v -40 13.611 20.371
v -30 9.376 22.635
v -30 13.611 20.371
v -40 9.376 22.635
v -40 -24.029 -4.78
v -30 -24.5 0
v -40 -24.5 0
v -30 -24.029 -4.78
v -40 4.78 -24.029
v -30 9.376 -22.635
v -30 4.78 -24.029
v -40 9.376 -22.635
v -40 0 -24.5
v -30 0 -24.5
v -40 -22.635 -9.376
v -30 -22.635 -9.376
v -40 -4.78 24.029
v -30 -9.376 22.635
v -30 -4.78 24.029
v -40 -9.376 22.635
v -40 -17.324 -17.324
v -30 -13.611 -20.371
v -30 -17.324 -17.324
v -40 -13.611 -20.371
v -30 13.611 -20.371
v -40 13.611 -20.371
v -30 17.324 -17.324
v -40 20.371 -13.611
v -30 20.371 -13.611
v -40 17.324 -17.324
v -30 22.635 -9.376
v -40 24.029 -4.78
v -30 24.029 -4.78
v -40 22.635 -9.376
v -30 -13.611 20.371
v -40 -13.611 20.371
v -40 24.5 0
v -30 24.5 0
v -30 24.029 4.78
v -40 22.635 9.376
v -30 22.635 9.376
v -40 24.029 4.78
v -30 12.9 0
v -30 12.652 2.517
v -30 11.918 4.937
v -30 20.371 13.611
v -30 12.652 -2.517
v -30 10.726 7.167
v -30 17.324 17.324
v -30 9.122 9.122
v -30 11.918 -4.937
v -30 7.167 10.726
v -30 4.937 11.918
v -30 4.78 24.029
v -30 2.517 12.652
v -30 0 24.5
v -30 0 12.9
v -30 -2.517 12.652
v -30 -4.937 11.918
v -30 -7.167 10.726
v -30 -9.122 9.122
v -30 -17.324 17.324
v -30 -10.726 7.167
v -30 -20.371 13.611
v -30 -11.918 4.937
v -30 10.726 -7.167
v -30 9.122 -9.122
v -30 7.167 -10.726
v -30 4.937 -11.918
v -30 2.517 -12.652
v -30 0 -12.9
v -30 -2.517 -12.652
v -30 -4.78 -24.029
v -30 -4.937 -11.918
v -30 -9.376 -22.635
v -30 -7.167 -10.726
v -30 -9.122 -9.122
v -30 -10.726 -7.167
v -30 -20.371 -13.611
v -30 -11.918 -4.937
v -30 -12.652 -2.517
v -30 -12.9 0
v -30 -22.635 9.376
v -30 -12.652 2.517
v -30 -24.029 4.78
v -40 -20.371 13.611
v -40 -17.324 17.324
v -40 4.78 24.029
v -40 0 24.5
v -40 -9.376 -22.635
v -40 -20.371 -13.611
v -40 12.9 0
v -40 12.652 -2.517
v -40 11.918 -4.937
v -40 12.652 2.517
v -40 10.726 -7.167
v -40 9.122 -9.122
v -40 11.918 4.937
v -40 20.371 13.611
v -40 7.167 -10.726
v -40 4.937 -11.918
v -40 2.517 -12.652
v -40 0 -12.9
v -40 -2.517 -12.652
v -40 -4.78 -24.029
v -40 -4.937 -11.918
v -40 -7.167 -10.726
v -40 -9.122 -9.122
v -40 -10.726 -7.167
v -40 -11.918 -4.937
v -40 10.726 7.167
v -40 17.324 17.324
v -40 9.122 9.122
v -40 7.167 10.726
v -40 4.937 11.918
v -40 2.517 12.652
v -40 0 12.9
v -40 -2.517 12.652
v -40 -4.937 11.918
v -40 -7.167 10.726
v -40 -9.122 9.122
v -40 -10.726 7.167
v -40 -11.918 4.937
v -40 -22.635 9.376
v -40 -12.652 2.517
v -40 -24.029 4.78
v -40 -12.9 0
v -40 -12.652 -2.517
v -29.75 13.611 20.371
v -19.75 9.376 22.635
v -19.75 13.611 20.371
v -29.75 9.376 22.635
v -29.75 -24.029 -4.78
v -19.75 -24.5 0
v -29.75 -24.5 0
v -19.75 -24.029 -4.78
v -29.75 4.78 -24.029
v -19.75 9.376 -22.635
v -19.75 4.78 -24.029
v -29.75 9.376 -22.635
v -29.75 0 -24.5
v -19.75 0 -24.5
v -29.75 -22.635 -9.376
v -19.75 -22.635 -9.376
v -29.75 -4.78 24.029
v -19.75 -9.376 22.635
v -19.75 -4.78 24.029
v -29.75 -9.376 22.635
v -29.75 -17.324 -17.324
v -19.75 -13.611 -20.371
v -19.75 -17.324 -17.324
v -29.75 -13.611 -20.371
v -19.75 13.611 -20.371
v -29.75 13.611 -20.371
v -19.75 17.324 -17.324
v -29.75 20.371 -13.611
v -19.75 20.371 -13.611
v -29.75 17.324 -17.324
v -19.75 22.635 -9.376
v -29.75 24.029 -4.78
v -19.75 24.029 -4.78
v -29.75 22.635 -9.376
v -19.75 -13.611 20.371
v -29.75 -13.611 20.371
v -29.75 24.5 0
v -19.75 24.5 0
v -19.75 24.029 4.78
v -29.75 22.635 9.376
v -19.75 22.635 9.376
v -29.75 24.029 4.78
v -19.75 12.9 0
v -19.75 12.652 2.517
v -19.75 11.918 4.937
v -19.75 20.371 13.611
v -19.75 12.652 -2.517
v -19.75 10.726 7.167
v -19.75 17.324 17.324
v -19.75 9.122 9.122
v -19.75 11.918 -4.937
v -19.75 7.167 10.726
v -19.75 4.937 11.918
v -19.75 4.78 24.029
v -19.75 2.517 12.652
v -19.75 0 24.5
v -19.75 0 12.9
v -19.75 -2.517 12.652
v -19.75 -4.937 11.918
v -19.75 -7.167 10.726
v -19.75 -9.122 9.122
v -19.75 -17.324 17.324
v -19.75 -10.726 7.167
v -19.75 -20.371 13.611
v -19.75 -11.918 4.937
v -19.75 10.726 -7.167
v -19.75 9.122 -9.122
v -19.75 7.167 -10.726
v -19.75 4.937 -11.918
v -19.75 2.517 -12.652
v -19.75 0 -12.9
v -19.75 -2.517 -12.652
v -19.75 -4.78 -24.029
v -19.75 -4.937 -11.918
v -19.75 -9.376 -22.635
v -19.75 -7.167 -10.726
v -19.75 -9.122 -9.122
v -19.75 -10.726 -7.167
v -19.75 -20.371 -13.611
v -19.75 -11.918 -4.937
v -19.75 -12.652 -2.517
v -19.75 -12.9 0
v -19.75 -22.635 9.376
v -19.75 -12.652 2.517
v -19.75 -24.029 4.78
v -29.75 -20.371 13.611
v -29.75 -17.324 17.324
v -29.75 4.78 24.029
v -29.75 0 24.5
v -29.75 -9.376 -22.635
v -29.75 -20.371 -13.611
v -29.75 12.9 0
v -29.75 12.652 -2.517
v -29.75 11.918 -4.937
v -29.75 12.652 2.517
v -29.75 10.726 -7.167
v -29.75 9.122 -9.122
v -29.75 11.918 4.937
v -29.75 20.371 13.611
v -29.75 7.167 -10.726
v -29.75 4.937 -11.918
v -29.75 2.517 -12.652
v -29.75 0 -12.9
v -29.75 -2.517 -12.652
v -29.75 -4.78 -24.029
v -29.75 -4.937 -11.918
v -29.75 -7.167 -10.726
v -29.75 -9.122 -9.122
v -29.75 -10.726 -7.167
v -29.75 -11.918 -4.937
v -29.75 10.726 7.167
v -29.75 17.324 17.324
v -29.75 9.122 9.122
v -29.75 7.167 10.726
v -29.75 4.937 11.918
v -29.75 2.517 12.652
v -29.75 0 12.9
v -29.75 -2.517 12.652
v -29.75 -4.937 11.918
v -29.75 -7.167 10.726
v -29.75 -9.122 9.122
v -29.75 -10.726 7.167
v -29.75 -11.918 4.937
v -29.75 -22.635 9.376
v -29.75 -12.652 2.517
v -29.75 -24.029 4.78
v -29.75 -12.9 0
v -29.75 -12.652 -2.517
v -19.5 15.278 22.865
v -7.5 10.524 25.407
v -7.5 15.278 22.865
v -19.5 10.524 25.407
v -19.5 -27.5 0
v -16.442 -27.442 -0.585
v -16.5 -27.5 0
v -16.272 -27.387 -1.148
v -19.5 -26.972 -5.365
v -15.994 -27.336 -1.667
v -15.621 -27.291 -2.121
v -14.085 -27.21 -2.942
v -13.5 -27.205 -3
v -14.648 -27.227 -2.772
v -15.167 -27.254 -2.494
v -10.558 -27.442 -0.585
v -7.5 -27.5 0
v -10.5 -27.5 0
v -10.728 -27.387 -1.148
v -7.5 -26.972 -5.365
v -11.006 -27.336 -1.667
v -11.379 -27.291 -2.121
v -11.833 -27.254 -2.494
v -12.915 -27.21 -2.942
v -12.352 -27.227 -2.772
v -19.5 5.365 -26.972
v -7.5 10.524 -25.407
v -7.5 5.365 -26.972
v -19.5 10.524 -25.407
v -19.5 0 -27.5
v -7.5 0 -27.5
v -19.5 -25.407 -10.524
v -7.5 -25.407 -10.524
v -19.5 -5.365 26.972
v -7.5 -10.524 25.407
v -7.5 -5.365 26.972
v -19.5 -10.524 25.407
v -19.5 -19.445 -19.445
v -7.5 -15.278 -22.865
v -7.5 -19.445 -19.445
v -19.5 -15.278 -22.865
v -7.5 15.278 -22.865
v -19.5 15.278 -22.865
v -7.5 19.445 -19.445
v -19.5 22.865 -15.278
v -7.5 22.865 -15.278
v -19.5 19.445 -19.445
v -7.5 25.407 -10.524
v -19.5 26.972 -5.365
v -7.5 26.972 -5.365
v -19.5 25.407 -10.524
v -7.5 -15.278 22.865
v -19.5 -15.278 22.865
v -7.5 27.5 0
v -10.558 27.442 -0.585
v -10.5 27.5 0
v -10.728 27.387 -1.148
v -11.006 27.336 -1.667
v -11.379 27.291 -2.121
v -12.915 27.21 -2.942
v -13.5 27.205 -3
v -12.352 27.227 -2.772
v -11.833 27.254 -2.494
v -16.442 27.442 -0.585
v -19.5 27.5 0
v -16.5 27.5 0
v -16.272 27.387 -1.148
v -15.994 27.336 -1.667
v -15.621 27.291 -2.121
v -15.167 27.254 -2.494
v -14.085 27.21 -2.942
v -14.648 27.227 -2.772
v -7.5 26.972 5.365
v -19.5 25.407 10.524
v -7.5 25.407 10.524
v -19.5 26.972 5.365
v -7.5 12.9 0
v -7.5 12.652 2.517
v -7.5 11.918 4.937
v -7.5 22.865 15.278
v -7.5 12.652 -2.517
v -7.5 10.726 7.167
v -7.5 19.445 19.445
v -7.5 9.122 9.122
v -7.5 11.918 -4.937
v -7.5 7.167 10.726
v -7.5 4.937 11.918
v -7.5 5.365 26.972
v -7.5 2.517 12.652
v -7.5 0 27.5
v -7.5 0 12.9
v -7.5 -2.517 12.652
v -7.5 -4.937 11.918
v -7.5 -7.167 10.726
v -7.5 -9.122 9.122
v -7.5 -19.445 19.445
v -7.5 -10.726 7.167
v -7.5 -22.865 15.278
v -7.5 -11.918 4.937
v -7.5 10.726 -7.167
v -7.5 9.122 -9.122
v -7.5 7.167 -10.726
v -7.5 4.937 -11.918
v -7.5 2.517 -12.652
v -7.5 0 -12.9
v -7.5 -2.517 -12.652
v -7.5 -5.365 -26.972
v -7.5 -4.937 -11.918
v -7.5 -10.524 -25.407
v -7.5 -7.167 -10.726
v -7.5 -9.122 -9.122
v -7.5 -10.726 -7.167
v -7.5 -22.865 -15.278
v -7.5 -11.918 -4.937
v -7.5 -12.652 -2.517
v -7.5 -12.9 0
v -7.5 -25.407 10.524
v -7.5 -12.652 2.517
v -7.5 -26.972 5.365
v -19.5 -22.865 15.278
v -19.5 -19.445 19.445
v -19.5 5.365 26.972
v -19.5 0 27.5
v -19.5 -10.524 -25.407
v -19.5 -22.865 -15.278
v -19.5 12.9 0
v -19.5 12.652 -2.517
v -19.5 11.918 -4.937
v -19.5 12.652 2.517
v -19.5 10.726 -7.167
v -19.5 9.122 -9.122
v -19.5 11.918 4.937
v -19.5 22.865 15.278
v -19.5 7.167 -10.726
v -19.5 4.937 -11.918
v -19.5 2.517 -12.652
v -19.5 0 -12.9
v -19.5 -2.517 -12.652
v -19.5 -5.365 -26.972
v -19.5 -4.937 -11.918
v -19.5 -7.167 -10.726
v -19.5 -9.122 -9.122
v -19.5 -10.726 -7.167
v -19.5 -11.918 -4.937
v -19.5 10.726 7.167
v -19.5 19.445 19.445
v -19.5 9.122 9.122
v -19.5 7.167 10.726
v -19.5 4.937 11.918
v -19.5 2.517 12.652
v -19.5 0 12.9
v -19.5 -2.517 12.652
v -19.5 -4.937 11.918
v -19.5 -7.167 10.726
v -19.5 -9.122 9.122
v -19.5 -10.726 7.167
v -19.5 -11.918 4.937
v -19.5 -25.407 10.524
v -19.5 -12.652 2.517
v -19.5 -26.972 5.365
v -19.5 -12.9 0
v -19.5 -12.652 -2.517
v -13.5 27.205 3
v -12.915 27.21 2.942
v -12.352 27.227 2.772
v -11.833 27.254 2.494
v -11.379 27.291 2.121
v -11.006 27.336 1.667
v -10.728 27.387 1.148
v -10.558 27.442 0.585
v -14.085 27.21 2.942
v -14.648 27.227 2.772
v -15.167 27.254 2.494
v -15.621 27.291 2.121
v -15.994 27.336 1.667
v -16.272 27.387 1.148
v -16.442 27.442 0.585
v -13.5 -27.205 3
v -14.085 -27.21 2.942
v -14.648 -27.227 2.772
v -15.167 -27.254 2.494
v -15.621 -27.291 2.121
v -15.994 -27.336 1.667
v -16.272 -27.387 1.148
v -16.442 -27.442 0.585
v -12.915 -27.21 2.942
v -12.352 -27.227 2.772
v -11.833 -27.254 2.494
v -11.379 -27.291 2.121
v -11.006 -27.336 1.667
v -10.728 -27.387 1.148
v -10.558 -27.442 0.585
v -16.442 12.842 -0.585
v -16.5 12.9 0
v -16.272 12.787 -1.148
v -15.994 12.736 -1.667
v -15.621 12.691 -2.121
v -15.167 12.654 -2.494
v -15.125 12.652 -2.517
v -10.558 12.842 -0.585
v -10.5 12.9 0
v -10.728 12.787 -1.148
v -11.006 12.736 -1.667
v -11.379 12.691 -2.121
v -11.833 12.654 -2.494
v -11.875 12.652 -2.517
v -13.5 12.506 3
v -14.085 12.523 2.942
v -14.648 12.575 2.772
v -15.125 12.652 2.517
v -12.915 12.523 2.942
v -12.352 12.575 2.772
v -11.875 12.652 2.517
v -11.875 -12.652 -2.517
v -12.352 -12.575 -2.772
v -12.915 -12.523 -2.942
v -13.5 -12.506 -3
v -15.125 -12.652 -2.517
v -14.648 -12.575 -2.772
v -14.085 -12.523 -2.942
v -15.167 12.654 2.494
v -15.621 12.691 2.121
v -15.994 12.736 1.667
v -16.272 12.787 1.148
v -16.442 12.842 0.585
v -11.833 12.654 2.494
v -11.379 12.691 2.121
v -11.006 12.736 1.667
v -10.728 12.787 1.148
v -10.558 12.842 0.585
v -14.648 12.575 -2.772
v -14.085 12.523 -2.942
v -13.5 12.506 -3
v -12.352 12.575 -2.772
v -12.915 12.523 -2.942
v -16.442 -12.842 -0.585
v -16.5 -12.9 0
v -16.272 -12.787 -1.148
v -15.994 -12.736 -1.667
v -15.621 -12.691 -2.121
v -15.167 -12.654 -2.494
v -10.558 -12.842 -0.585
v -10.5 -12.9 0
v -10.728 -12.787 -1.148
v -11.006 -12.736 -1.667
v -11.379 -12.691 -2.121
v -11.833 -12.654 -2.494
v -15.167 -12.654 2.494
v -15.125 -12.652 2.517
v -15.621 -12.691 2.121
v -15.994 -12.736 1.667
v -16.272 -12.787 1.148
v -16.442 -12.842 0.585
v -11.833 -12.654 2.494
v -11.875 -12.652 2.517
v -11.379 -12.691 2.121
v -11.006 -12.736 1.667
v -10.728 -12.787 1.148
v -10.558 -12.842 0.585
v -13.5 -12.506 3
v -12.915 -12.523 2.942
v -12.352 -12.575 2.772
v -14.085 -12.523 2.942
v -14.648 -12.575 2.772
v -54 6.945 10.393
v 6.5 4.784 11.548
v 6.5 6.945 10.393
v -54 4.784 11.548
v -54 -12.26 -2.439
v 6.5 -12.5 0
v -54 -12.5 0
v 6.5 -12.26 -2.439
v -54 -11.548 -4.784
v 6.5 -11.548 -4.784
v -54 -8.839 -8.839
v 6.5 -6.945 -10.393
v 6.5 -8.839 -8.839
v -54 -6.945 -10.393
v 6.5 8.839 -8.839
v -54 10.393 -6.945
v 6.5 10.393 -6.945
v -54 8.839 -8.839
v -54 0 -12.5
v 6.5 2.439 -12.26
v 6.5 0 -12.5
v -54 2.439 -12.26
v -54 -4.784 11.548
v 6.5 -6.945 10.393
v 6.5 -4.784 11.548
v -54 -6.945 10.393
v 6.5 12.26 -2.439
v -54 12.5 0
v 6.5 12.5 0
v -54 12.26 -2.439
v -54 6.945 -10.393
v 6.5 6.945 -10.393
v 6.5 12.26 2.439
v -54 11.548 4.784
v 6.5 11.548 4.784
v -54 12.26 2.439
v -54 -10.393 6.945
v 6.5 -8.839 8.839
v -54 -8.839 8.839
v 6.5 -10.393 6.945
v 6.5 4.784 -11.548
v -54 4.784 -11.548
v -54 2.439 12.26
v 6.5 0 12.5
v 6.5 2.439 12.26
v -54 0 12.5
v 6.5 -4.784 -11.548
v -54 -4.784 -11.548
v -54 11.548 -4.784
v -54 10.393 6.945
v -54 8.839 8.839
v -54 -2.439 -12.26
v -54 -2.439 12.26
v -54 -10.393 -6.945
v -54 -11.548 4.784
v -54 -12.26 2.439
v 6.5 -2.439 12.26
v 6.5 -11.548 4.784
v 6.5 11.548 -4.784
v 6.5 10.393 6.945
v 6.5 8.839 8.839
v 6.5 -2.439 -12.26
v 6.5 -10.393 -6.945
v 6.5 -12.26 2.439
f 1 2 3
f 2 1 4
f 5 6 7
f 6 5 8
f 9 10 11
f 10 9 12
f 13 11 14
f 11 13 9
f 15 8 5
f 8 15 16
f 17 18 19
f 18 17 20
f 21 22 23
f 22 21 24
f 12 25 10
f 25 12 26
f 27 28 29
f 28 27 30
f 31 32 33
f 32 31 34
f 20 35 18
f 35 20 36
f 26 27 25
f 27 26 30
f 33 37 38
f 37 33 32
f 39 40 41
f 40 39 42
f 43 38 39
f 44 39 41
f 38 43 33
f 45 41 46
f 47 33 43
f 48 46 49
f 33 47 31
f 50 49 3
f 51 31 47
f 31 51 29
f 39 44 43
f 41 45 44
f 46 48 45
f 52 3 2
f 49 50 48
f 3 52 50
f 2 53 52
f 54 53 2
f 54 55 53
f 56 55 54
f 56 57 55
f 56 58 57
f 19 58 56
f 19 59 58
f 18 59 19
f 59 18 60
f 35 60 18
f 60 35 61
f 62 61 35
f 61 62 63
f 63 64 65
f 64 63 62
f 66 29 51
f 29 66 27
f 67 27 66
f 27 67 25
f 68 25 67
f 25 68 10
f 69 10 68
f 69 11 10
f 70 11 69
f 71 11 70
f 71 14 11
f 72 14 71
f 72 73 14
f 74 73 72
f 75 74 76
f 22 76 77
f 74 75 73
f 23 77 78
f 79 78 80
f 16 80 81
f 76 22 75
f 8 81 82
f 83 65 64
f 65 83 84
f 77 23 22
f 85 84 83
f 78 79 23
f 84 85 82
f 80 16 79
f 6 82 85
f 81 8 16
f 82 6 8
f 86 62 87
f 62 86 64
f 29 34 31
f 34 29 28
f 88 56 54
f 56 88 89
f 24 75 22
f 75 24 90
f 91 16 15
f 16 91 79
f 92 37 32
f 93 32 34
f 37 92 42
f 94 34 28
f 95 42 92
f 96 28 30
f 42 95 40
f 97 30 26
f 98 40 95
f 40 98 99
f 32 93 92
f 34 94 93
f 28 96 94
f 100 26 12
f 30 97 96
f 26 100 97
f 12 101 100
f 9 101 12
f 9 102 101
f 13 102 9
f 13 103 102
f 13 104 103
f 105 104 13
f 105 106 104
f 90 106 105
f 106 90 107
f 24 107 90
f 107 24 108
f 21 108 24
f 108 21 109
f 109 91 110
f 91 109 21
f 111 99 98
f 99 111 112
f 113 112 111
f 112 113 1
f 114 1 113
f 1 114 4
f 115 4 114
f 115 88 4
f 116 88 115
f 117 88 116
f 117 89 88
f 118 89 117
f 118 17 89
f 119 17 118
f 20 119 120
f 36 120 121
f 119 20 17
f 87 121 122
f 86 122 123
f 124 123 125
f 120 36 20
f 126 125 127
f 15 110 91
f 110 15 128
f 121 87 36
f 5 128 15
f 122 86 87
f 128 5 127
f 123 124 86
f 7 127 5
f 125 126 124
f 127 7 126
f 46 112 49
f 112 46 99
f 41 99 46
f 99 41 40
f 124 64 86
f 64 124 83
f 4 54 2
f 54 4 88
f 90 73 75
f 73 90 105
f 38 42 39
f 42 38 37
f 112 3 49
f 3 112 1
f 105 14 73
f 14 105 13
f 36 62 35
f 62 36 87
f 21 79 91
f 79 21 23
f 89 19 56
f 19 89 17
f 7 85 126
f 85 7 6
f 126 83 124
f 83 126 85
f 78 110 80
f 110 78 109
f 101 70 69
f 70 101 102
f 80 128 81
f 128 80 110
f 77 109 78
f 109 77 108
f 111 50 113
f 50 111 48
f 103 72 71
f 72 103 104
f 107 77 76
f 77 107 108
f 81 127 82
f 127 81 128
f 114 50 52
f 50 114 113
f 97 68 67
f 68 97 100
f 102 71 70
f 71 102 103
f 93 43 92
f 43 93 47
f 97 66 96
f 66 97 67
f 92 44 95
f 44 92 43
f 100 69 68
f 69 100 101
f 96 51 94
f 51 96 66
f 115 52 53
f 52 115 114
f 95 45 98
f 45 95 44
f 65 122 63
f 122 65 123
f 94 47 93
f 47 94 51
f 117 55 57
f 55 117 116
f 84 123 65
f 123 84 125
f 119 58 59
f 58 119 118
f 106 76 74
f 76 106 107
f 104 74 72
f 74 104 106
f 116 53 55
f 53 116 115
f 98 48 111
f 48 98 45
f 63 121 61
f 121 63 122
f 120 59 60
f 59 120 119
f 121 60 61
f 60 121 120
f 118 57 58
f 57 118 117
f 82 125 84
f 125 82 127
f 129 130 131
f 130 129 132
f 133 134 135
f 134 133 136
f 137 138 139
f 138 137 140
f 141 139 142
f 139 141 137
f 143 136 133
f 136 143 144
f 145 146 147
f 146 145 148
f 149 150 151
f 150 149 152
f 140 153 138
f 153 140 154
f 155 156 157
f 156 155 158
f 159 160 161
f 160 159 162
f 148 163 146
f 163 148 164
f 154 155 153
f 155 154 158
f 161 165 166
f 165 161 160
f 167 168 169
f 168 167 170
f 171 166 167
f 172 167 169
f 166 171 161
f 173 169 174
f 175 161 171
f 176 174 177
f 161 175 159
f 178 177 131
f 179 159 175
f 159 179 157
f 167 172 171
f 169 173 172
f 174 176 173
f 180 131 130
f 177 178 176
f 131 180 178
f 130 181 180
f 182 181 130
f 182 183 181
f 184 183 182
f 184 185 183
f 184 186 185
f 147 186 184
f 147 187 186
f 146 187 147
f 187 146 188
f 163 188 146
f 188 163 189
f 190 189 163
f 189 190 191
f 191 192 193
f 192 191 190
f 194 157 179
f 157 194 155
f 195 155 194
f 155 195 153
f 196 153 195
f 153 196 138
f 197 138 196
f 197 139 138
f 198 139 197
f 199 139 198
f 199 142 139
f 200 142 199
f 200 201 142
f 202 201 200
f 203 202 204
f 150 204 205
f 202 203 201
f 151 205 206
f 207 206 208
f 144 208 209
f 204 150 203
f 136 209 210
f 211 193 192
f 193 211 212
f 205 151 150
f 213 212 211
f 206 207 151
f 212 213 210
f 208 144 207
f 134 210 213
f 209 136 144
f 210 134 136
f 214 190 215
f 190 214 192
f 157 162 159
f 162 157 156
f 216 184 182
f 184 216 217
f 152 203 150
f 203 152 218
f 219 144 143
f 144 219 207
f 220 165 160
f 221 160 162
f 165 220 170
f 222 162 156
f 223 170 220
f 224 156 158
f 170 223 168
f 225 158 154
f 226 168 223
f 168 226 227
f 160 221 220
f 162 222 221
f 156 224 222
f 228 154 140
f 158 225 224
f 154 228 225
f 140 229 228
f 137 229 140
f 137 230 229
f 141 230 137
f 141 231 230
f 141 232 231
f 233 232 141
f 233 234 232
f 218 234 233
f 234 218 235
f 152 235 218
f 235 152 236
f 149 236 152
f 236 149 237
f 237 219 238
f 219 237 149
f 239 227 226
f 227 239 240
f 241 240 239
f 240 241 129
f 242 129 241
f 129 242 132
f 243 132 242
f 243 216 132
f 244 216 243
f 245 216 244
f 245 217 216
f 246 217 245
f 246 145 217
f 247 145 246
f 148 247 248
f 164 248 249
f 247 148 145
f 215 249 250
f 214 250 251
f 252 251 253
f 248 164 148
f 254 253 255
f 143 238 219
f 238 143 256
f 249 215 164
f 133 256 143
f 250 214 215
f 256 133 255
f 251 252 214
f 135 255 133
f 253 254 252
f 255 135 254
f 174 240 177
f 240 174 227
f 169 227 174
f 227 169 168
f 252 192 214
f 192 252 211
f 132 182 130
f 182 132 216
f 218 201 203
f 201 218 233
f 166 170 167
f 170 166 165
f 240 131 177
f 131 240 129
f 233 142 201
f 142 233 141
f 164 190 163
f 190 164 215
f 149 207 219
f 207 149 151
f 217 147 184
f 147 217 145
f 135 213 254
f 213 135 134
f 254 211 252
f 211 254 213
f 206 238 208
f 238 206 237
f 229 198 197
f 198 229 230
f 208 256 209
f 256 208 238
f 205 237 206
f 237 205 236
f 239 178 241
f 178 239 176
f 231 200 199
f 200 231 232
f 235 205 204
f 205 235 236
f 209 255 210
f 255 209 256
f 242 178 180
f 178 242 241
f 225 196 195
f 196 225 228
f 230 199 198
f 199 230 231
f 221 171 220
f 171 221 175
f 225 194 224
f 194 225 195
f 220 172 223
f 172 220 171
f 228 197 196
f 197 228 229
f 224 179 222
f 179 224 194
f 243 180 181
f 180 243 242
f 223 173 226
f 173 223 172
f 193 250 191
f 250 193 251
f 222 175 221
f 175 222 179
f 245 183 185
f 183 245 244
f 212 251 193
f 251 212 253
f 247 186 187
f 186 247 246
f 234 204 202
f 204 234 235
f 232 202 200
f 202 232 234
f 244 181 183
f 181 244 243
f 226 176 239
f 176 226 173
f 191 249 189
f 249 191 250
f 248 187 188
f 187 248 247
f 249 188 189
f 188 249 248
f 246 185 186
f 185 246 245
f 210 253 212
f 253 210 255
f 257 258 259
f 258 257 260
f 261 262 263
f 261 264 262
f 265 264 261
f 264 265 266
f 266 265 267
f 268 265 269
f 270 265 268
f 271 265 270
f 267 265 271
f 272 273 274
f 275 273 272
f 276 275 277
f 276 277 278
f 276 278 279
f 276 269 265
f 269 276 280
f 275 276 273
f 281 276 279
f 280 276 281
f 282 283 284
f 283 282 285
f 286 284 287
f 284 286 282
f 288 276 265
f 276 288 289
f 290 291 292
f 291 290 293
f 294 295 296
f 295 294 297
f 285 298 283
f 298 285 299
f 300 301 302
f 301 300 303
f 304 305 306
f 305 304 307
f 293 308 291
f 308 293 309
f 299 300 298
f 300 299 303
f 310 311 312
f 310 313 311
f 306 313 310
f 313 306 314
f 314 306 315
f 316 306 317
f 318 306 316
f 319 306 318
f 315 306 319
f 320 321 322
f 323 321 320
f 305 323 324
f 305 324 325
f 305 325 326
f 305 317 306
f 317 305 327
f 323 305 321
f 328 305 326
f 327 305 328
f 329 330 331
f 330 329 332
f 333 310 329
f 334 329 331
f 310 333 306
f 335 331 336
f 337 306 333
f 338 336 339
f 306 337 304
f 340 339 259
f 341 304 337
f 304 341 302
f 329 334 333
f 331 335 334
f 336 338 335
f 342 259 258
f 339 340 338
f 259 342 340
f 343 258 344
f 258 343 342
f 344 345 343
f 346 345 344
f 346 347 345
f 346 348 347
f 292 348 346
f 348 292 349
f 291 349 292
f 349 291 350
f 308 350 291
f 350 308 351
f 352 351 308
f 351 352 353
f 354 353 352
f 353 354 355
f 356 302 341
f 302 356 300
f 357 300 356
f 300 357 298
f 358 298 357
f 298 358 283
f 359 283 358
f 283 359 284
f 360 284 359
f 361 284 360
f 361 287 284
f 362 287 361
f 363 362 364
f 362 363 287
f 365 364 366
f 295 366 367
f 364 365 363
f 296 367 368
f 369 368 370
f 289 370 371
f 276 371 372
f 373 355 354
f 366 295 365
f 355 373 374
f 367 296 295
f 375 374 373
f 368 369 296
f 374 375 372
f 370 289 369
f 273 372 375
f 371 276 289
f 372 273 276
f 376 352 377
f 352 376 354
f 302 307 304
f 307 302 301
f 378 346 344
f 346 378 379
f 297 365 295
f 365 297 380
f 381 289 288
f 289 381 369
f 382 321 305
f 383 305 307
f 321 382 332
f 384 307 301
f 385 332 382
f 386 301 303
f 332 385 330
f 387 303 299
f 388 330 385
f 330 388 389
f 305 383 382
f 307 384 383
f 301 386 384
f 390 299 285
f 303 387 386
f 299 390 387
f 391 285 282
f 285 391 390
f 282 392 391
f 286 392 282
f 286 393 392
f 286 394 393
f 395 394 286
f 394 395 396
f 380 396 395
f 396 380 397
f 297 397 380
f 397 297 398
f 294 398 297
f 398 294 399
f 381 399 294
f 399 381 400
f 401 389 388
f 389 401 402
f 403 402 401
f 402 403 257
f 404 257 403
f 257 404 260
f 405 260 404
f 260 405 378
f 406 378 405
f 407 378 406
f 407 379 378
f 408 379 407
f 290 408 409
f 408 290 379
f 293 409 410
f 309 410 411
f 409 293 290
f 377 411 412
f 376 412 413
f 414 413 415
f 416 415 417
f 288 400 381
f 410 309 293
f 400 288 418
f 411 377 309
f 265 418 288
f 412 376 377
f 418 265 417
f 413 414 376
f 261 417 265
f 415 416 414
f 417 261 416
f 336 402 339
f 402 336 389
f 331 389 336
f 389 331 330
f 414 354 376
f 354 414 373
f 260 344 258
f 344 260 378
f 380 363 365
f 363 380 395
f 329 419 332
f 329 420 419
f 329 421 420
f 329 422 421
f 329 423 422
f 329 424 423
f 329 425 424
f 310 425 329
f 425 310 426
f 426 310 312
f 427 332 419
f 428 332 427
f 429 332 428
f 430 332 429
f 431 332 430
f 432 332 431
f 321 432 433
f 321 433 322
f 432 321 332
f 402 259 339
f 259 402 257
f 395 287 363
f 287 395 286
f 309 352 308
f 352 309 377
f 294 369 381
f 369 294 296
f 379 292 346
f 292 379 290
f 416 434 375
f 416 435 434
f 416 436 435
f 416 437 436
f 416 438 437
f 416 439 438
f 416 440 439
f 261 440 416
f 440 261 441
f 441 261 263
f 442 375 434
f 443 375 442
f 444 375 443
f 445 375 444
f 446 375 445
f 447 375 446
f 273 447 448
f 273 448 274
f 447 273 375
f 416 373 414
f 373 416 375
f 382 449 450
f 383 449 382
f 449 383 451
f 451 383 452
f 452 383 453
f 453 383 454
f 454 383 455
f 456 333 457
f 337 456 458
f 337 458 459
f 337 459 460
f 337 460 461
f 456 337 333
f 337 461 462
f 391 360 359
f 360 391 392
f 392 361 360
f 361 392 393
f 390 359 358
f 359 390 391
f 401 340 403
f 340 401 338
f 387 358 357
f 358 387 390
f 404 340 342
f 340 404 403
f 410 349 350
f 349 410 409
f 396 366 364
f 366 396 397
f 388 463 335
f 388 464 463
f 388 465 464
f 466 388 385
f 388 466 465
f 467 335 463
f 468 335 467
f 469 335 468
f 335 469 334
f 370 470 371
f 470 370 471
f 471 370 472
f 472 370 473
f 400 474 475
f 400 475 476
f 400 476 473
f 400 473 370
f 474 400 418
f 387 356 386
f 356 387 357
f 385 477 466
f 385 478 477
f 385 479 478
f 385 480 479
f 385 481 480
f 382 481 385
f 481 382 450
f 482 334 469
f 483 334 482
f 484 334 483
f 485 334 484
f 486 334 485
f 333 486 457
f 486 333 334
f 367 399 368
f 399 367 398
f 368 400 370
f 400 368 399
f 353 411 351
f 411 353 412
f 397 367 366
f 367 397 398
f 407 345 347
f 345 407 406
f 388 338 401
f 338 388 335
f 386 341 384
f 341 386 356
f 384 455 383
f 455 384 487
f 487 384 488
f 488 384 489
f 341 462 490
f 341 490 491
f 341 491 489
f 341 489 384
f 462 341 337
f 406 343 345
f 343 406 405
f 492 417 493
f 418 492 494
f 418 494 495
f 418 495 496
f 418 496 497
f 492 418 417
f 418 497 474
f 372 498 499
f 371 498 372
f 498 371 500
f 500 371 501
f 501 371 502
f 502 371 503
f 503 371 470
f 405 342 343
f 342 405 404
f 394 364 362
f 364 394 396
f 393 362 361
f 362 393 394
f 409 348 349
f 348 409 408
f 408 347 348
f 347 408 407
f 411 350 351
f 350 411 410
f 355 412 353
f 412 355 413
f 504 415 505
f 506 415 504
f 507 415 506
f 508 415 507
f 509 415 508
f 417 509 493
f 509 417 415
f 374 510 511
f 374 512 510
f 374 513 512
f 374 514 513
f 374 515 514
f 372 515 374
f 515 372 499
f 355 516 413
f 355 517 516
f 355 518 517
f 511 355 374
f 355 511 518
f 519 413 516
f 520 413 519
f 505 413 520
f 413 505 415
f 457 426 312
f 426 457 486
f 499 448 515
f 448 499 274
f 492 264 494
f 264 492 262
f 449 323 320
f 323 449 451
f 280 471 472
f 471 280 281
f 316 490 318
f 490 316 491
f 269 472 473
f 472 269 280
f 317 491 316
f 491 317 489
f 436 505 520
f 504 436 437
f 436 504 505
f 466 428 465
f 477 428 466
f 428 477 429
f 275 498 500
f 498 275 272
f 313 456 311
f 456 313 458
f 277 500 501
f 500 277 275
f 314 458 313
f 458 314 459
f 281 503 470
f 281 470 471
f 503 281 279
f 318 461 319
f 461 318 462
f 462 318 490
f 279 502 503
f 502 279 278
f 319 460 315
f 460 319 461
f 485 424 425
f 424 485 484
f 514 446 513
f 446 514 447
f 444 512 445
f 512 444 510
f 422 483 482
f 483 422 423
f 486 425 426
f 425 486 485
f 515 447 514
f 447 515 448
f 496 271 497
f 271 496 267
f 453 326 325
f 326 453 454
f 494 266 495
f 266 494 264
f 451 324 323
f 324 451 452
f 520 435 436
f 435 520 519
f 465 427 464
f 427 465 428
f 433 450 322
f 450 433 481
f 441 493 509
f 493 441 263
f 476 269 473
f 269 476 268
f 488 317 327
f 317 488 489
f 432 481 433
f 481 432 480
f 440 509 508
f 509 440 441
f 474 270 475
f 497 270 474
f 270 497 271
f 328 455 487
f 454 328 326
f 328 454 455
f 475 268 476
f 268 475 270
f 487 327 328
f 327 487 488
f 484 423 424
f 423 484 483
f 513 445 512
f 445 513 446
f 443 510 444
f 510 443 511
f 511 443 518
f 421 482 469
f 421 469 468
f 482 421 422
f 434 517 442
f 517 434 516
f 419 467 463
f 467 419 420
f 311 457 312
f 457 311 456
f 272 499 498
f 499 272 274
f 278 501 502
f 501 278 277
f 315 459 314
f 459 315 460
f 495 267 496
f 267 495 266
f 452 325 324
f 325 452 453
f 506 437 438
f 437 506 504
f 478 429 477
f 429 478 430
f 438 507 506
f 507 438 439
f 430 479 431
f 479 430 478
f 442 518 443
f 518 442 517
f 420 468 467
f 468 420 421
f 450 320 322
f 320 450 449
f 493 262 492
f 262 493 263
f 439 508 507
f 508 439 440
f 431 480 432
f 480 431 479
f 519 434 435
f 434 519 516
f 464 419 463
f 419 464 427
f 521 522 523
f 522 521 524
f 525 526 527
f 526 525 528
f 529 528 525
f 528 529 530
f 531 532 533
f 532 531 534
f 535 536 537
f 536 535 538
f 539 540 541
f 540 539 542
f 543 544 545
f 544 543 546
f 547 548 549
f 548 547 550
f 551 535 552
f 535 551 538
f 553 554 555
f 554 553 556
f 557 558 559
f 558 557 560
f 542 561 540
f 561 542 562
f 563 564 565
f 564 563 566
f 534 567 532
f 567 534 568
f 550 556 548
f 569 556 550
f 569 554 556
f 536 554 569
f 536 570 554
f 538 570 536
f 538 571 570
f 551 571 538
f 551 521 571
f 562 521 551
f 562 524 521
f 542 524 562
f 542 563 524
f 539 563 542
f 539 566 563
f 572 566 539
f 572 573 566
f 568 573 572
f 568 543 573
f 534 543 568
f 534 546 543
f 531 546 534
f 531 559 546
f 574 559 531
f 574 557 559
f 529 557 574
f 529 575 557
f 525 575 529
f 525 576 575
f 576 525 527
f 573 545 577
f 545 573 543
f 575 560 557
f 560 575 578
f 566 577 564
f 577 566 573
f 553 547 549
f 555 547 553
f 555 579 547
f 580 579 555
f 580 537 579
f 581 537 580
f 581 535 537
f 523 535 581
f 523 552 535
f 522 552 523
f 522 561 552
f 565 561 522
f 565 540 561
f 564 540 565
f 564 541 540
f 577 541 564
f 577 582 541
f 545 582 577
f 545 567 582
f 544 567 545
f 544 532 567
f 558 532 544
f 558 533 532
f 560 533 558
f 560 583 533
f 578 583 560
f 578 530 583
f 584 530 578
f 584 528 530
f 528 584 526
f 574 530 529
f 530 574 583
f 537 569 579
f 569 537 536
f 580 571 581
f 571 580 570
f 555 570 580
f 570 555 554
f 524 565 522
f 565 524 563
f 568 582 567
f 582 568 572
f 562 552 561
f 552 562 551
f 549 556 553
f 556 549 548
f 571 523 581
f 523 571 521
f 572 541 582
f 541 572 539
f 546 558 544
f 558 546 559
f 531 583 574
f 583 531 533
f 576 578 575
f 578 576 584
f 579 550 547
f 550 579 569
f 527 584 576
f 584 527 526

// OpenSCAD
$fn = 32;

// ------------------------------------------------------------------------
// Shaft with rings and collars: d25 shaft, 3 rings
// Every part is its own module, assembly() places them once.
// ------------------------------------------------------------------------

// --- part 1 ---
module shaft() {
  translate([0, 0, -30.25]) cylinder(h = 60.5, d = 25);
}

// --- part 2 ---
module spacer_a() {
  difference() {
      translate([0, 0, 0]) cylinder(h = 10, d = 49);
      translate([0, 0, -1]) cylinder(h = 12, d = 25.8);
    }
}

// --- part 3 ---
module spacer_b() {
  difference() {
      translate([0, 0, 0]) cylinder(h = 10, d = 49);
      translate([0, 0, -1]) cylinder(h = 12, d = 25.8);
    }
}

// --- part 4 ---
module collar_a() {
  difference() {
    cylinder(h = 12, d = 55);
    translate([0, 0, -1]) cylinder(h = 14, d = 25.8);
    translate([0, 0, 6]) rotate([90, 0, 0]) cylinder(h = 57, d = 6, center = true);
  }
}

// --- assembly ---
module assembly() {
  translate([-23.75, 0, 0]) rotate([0, 90, 0]) shaft();
  translate([-40, 0, 0]) rotate([0, 90, 0]) spacer_a();
  translate([-29.75, 0, 0]) rotate([0, 90, 0]) spacer_b();
  translate([-19.5, 0, 0]) rotate([0, 90, 0]) collar_a();
}

assembly();
